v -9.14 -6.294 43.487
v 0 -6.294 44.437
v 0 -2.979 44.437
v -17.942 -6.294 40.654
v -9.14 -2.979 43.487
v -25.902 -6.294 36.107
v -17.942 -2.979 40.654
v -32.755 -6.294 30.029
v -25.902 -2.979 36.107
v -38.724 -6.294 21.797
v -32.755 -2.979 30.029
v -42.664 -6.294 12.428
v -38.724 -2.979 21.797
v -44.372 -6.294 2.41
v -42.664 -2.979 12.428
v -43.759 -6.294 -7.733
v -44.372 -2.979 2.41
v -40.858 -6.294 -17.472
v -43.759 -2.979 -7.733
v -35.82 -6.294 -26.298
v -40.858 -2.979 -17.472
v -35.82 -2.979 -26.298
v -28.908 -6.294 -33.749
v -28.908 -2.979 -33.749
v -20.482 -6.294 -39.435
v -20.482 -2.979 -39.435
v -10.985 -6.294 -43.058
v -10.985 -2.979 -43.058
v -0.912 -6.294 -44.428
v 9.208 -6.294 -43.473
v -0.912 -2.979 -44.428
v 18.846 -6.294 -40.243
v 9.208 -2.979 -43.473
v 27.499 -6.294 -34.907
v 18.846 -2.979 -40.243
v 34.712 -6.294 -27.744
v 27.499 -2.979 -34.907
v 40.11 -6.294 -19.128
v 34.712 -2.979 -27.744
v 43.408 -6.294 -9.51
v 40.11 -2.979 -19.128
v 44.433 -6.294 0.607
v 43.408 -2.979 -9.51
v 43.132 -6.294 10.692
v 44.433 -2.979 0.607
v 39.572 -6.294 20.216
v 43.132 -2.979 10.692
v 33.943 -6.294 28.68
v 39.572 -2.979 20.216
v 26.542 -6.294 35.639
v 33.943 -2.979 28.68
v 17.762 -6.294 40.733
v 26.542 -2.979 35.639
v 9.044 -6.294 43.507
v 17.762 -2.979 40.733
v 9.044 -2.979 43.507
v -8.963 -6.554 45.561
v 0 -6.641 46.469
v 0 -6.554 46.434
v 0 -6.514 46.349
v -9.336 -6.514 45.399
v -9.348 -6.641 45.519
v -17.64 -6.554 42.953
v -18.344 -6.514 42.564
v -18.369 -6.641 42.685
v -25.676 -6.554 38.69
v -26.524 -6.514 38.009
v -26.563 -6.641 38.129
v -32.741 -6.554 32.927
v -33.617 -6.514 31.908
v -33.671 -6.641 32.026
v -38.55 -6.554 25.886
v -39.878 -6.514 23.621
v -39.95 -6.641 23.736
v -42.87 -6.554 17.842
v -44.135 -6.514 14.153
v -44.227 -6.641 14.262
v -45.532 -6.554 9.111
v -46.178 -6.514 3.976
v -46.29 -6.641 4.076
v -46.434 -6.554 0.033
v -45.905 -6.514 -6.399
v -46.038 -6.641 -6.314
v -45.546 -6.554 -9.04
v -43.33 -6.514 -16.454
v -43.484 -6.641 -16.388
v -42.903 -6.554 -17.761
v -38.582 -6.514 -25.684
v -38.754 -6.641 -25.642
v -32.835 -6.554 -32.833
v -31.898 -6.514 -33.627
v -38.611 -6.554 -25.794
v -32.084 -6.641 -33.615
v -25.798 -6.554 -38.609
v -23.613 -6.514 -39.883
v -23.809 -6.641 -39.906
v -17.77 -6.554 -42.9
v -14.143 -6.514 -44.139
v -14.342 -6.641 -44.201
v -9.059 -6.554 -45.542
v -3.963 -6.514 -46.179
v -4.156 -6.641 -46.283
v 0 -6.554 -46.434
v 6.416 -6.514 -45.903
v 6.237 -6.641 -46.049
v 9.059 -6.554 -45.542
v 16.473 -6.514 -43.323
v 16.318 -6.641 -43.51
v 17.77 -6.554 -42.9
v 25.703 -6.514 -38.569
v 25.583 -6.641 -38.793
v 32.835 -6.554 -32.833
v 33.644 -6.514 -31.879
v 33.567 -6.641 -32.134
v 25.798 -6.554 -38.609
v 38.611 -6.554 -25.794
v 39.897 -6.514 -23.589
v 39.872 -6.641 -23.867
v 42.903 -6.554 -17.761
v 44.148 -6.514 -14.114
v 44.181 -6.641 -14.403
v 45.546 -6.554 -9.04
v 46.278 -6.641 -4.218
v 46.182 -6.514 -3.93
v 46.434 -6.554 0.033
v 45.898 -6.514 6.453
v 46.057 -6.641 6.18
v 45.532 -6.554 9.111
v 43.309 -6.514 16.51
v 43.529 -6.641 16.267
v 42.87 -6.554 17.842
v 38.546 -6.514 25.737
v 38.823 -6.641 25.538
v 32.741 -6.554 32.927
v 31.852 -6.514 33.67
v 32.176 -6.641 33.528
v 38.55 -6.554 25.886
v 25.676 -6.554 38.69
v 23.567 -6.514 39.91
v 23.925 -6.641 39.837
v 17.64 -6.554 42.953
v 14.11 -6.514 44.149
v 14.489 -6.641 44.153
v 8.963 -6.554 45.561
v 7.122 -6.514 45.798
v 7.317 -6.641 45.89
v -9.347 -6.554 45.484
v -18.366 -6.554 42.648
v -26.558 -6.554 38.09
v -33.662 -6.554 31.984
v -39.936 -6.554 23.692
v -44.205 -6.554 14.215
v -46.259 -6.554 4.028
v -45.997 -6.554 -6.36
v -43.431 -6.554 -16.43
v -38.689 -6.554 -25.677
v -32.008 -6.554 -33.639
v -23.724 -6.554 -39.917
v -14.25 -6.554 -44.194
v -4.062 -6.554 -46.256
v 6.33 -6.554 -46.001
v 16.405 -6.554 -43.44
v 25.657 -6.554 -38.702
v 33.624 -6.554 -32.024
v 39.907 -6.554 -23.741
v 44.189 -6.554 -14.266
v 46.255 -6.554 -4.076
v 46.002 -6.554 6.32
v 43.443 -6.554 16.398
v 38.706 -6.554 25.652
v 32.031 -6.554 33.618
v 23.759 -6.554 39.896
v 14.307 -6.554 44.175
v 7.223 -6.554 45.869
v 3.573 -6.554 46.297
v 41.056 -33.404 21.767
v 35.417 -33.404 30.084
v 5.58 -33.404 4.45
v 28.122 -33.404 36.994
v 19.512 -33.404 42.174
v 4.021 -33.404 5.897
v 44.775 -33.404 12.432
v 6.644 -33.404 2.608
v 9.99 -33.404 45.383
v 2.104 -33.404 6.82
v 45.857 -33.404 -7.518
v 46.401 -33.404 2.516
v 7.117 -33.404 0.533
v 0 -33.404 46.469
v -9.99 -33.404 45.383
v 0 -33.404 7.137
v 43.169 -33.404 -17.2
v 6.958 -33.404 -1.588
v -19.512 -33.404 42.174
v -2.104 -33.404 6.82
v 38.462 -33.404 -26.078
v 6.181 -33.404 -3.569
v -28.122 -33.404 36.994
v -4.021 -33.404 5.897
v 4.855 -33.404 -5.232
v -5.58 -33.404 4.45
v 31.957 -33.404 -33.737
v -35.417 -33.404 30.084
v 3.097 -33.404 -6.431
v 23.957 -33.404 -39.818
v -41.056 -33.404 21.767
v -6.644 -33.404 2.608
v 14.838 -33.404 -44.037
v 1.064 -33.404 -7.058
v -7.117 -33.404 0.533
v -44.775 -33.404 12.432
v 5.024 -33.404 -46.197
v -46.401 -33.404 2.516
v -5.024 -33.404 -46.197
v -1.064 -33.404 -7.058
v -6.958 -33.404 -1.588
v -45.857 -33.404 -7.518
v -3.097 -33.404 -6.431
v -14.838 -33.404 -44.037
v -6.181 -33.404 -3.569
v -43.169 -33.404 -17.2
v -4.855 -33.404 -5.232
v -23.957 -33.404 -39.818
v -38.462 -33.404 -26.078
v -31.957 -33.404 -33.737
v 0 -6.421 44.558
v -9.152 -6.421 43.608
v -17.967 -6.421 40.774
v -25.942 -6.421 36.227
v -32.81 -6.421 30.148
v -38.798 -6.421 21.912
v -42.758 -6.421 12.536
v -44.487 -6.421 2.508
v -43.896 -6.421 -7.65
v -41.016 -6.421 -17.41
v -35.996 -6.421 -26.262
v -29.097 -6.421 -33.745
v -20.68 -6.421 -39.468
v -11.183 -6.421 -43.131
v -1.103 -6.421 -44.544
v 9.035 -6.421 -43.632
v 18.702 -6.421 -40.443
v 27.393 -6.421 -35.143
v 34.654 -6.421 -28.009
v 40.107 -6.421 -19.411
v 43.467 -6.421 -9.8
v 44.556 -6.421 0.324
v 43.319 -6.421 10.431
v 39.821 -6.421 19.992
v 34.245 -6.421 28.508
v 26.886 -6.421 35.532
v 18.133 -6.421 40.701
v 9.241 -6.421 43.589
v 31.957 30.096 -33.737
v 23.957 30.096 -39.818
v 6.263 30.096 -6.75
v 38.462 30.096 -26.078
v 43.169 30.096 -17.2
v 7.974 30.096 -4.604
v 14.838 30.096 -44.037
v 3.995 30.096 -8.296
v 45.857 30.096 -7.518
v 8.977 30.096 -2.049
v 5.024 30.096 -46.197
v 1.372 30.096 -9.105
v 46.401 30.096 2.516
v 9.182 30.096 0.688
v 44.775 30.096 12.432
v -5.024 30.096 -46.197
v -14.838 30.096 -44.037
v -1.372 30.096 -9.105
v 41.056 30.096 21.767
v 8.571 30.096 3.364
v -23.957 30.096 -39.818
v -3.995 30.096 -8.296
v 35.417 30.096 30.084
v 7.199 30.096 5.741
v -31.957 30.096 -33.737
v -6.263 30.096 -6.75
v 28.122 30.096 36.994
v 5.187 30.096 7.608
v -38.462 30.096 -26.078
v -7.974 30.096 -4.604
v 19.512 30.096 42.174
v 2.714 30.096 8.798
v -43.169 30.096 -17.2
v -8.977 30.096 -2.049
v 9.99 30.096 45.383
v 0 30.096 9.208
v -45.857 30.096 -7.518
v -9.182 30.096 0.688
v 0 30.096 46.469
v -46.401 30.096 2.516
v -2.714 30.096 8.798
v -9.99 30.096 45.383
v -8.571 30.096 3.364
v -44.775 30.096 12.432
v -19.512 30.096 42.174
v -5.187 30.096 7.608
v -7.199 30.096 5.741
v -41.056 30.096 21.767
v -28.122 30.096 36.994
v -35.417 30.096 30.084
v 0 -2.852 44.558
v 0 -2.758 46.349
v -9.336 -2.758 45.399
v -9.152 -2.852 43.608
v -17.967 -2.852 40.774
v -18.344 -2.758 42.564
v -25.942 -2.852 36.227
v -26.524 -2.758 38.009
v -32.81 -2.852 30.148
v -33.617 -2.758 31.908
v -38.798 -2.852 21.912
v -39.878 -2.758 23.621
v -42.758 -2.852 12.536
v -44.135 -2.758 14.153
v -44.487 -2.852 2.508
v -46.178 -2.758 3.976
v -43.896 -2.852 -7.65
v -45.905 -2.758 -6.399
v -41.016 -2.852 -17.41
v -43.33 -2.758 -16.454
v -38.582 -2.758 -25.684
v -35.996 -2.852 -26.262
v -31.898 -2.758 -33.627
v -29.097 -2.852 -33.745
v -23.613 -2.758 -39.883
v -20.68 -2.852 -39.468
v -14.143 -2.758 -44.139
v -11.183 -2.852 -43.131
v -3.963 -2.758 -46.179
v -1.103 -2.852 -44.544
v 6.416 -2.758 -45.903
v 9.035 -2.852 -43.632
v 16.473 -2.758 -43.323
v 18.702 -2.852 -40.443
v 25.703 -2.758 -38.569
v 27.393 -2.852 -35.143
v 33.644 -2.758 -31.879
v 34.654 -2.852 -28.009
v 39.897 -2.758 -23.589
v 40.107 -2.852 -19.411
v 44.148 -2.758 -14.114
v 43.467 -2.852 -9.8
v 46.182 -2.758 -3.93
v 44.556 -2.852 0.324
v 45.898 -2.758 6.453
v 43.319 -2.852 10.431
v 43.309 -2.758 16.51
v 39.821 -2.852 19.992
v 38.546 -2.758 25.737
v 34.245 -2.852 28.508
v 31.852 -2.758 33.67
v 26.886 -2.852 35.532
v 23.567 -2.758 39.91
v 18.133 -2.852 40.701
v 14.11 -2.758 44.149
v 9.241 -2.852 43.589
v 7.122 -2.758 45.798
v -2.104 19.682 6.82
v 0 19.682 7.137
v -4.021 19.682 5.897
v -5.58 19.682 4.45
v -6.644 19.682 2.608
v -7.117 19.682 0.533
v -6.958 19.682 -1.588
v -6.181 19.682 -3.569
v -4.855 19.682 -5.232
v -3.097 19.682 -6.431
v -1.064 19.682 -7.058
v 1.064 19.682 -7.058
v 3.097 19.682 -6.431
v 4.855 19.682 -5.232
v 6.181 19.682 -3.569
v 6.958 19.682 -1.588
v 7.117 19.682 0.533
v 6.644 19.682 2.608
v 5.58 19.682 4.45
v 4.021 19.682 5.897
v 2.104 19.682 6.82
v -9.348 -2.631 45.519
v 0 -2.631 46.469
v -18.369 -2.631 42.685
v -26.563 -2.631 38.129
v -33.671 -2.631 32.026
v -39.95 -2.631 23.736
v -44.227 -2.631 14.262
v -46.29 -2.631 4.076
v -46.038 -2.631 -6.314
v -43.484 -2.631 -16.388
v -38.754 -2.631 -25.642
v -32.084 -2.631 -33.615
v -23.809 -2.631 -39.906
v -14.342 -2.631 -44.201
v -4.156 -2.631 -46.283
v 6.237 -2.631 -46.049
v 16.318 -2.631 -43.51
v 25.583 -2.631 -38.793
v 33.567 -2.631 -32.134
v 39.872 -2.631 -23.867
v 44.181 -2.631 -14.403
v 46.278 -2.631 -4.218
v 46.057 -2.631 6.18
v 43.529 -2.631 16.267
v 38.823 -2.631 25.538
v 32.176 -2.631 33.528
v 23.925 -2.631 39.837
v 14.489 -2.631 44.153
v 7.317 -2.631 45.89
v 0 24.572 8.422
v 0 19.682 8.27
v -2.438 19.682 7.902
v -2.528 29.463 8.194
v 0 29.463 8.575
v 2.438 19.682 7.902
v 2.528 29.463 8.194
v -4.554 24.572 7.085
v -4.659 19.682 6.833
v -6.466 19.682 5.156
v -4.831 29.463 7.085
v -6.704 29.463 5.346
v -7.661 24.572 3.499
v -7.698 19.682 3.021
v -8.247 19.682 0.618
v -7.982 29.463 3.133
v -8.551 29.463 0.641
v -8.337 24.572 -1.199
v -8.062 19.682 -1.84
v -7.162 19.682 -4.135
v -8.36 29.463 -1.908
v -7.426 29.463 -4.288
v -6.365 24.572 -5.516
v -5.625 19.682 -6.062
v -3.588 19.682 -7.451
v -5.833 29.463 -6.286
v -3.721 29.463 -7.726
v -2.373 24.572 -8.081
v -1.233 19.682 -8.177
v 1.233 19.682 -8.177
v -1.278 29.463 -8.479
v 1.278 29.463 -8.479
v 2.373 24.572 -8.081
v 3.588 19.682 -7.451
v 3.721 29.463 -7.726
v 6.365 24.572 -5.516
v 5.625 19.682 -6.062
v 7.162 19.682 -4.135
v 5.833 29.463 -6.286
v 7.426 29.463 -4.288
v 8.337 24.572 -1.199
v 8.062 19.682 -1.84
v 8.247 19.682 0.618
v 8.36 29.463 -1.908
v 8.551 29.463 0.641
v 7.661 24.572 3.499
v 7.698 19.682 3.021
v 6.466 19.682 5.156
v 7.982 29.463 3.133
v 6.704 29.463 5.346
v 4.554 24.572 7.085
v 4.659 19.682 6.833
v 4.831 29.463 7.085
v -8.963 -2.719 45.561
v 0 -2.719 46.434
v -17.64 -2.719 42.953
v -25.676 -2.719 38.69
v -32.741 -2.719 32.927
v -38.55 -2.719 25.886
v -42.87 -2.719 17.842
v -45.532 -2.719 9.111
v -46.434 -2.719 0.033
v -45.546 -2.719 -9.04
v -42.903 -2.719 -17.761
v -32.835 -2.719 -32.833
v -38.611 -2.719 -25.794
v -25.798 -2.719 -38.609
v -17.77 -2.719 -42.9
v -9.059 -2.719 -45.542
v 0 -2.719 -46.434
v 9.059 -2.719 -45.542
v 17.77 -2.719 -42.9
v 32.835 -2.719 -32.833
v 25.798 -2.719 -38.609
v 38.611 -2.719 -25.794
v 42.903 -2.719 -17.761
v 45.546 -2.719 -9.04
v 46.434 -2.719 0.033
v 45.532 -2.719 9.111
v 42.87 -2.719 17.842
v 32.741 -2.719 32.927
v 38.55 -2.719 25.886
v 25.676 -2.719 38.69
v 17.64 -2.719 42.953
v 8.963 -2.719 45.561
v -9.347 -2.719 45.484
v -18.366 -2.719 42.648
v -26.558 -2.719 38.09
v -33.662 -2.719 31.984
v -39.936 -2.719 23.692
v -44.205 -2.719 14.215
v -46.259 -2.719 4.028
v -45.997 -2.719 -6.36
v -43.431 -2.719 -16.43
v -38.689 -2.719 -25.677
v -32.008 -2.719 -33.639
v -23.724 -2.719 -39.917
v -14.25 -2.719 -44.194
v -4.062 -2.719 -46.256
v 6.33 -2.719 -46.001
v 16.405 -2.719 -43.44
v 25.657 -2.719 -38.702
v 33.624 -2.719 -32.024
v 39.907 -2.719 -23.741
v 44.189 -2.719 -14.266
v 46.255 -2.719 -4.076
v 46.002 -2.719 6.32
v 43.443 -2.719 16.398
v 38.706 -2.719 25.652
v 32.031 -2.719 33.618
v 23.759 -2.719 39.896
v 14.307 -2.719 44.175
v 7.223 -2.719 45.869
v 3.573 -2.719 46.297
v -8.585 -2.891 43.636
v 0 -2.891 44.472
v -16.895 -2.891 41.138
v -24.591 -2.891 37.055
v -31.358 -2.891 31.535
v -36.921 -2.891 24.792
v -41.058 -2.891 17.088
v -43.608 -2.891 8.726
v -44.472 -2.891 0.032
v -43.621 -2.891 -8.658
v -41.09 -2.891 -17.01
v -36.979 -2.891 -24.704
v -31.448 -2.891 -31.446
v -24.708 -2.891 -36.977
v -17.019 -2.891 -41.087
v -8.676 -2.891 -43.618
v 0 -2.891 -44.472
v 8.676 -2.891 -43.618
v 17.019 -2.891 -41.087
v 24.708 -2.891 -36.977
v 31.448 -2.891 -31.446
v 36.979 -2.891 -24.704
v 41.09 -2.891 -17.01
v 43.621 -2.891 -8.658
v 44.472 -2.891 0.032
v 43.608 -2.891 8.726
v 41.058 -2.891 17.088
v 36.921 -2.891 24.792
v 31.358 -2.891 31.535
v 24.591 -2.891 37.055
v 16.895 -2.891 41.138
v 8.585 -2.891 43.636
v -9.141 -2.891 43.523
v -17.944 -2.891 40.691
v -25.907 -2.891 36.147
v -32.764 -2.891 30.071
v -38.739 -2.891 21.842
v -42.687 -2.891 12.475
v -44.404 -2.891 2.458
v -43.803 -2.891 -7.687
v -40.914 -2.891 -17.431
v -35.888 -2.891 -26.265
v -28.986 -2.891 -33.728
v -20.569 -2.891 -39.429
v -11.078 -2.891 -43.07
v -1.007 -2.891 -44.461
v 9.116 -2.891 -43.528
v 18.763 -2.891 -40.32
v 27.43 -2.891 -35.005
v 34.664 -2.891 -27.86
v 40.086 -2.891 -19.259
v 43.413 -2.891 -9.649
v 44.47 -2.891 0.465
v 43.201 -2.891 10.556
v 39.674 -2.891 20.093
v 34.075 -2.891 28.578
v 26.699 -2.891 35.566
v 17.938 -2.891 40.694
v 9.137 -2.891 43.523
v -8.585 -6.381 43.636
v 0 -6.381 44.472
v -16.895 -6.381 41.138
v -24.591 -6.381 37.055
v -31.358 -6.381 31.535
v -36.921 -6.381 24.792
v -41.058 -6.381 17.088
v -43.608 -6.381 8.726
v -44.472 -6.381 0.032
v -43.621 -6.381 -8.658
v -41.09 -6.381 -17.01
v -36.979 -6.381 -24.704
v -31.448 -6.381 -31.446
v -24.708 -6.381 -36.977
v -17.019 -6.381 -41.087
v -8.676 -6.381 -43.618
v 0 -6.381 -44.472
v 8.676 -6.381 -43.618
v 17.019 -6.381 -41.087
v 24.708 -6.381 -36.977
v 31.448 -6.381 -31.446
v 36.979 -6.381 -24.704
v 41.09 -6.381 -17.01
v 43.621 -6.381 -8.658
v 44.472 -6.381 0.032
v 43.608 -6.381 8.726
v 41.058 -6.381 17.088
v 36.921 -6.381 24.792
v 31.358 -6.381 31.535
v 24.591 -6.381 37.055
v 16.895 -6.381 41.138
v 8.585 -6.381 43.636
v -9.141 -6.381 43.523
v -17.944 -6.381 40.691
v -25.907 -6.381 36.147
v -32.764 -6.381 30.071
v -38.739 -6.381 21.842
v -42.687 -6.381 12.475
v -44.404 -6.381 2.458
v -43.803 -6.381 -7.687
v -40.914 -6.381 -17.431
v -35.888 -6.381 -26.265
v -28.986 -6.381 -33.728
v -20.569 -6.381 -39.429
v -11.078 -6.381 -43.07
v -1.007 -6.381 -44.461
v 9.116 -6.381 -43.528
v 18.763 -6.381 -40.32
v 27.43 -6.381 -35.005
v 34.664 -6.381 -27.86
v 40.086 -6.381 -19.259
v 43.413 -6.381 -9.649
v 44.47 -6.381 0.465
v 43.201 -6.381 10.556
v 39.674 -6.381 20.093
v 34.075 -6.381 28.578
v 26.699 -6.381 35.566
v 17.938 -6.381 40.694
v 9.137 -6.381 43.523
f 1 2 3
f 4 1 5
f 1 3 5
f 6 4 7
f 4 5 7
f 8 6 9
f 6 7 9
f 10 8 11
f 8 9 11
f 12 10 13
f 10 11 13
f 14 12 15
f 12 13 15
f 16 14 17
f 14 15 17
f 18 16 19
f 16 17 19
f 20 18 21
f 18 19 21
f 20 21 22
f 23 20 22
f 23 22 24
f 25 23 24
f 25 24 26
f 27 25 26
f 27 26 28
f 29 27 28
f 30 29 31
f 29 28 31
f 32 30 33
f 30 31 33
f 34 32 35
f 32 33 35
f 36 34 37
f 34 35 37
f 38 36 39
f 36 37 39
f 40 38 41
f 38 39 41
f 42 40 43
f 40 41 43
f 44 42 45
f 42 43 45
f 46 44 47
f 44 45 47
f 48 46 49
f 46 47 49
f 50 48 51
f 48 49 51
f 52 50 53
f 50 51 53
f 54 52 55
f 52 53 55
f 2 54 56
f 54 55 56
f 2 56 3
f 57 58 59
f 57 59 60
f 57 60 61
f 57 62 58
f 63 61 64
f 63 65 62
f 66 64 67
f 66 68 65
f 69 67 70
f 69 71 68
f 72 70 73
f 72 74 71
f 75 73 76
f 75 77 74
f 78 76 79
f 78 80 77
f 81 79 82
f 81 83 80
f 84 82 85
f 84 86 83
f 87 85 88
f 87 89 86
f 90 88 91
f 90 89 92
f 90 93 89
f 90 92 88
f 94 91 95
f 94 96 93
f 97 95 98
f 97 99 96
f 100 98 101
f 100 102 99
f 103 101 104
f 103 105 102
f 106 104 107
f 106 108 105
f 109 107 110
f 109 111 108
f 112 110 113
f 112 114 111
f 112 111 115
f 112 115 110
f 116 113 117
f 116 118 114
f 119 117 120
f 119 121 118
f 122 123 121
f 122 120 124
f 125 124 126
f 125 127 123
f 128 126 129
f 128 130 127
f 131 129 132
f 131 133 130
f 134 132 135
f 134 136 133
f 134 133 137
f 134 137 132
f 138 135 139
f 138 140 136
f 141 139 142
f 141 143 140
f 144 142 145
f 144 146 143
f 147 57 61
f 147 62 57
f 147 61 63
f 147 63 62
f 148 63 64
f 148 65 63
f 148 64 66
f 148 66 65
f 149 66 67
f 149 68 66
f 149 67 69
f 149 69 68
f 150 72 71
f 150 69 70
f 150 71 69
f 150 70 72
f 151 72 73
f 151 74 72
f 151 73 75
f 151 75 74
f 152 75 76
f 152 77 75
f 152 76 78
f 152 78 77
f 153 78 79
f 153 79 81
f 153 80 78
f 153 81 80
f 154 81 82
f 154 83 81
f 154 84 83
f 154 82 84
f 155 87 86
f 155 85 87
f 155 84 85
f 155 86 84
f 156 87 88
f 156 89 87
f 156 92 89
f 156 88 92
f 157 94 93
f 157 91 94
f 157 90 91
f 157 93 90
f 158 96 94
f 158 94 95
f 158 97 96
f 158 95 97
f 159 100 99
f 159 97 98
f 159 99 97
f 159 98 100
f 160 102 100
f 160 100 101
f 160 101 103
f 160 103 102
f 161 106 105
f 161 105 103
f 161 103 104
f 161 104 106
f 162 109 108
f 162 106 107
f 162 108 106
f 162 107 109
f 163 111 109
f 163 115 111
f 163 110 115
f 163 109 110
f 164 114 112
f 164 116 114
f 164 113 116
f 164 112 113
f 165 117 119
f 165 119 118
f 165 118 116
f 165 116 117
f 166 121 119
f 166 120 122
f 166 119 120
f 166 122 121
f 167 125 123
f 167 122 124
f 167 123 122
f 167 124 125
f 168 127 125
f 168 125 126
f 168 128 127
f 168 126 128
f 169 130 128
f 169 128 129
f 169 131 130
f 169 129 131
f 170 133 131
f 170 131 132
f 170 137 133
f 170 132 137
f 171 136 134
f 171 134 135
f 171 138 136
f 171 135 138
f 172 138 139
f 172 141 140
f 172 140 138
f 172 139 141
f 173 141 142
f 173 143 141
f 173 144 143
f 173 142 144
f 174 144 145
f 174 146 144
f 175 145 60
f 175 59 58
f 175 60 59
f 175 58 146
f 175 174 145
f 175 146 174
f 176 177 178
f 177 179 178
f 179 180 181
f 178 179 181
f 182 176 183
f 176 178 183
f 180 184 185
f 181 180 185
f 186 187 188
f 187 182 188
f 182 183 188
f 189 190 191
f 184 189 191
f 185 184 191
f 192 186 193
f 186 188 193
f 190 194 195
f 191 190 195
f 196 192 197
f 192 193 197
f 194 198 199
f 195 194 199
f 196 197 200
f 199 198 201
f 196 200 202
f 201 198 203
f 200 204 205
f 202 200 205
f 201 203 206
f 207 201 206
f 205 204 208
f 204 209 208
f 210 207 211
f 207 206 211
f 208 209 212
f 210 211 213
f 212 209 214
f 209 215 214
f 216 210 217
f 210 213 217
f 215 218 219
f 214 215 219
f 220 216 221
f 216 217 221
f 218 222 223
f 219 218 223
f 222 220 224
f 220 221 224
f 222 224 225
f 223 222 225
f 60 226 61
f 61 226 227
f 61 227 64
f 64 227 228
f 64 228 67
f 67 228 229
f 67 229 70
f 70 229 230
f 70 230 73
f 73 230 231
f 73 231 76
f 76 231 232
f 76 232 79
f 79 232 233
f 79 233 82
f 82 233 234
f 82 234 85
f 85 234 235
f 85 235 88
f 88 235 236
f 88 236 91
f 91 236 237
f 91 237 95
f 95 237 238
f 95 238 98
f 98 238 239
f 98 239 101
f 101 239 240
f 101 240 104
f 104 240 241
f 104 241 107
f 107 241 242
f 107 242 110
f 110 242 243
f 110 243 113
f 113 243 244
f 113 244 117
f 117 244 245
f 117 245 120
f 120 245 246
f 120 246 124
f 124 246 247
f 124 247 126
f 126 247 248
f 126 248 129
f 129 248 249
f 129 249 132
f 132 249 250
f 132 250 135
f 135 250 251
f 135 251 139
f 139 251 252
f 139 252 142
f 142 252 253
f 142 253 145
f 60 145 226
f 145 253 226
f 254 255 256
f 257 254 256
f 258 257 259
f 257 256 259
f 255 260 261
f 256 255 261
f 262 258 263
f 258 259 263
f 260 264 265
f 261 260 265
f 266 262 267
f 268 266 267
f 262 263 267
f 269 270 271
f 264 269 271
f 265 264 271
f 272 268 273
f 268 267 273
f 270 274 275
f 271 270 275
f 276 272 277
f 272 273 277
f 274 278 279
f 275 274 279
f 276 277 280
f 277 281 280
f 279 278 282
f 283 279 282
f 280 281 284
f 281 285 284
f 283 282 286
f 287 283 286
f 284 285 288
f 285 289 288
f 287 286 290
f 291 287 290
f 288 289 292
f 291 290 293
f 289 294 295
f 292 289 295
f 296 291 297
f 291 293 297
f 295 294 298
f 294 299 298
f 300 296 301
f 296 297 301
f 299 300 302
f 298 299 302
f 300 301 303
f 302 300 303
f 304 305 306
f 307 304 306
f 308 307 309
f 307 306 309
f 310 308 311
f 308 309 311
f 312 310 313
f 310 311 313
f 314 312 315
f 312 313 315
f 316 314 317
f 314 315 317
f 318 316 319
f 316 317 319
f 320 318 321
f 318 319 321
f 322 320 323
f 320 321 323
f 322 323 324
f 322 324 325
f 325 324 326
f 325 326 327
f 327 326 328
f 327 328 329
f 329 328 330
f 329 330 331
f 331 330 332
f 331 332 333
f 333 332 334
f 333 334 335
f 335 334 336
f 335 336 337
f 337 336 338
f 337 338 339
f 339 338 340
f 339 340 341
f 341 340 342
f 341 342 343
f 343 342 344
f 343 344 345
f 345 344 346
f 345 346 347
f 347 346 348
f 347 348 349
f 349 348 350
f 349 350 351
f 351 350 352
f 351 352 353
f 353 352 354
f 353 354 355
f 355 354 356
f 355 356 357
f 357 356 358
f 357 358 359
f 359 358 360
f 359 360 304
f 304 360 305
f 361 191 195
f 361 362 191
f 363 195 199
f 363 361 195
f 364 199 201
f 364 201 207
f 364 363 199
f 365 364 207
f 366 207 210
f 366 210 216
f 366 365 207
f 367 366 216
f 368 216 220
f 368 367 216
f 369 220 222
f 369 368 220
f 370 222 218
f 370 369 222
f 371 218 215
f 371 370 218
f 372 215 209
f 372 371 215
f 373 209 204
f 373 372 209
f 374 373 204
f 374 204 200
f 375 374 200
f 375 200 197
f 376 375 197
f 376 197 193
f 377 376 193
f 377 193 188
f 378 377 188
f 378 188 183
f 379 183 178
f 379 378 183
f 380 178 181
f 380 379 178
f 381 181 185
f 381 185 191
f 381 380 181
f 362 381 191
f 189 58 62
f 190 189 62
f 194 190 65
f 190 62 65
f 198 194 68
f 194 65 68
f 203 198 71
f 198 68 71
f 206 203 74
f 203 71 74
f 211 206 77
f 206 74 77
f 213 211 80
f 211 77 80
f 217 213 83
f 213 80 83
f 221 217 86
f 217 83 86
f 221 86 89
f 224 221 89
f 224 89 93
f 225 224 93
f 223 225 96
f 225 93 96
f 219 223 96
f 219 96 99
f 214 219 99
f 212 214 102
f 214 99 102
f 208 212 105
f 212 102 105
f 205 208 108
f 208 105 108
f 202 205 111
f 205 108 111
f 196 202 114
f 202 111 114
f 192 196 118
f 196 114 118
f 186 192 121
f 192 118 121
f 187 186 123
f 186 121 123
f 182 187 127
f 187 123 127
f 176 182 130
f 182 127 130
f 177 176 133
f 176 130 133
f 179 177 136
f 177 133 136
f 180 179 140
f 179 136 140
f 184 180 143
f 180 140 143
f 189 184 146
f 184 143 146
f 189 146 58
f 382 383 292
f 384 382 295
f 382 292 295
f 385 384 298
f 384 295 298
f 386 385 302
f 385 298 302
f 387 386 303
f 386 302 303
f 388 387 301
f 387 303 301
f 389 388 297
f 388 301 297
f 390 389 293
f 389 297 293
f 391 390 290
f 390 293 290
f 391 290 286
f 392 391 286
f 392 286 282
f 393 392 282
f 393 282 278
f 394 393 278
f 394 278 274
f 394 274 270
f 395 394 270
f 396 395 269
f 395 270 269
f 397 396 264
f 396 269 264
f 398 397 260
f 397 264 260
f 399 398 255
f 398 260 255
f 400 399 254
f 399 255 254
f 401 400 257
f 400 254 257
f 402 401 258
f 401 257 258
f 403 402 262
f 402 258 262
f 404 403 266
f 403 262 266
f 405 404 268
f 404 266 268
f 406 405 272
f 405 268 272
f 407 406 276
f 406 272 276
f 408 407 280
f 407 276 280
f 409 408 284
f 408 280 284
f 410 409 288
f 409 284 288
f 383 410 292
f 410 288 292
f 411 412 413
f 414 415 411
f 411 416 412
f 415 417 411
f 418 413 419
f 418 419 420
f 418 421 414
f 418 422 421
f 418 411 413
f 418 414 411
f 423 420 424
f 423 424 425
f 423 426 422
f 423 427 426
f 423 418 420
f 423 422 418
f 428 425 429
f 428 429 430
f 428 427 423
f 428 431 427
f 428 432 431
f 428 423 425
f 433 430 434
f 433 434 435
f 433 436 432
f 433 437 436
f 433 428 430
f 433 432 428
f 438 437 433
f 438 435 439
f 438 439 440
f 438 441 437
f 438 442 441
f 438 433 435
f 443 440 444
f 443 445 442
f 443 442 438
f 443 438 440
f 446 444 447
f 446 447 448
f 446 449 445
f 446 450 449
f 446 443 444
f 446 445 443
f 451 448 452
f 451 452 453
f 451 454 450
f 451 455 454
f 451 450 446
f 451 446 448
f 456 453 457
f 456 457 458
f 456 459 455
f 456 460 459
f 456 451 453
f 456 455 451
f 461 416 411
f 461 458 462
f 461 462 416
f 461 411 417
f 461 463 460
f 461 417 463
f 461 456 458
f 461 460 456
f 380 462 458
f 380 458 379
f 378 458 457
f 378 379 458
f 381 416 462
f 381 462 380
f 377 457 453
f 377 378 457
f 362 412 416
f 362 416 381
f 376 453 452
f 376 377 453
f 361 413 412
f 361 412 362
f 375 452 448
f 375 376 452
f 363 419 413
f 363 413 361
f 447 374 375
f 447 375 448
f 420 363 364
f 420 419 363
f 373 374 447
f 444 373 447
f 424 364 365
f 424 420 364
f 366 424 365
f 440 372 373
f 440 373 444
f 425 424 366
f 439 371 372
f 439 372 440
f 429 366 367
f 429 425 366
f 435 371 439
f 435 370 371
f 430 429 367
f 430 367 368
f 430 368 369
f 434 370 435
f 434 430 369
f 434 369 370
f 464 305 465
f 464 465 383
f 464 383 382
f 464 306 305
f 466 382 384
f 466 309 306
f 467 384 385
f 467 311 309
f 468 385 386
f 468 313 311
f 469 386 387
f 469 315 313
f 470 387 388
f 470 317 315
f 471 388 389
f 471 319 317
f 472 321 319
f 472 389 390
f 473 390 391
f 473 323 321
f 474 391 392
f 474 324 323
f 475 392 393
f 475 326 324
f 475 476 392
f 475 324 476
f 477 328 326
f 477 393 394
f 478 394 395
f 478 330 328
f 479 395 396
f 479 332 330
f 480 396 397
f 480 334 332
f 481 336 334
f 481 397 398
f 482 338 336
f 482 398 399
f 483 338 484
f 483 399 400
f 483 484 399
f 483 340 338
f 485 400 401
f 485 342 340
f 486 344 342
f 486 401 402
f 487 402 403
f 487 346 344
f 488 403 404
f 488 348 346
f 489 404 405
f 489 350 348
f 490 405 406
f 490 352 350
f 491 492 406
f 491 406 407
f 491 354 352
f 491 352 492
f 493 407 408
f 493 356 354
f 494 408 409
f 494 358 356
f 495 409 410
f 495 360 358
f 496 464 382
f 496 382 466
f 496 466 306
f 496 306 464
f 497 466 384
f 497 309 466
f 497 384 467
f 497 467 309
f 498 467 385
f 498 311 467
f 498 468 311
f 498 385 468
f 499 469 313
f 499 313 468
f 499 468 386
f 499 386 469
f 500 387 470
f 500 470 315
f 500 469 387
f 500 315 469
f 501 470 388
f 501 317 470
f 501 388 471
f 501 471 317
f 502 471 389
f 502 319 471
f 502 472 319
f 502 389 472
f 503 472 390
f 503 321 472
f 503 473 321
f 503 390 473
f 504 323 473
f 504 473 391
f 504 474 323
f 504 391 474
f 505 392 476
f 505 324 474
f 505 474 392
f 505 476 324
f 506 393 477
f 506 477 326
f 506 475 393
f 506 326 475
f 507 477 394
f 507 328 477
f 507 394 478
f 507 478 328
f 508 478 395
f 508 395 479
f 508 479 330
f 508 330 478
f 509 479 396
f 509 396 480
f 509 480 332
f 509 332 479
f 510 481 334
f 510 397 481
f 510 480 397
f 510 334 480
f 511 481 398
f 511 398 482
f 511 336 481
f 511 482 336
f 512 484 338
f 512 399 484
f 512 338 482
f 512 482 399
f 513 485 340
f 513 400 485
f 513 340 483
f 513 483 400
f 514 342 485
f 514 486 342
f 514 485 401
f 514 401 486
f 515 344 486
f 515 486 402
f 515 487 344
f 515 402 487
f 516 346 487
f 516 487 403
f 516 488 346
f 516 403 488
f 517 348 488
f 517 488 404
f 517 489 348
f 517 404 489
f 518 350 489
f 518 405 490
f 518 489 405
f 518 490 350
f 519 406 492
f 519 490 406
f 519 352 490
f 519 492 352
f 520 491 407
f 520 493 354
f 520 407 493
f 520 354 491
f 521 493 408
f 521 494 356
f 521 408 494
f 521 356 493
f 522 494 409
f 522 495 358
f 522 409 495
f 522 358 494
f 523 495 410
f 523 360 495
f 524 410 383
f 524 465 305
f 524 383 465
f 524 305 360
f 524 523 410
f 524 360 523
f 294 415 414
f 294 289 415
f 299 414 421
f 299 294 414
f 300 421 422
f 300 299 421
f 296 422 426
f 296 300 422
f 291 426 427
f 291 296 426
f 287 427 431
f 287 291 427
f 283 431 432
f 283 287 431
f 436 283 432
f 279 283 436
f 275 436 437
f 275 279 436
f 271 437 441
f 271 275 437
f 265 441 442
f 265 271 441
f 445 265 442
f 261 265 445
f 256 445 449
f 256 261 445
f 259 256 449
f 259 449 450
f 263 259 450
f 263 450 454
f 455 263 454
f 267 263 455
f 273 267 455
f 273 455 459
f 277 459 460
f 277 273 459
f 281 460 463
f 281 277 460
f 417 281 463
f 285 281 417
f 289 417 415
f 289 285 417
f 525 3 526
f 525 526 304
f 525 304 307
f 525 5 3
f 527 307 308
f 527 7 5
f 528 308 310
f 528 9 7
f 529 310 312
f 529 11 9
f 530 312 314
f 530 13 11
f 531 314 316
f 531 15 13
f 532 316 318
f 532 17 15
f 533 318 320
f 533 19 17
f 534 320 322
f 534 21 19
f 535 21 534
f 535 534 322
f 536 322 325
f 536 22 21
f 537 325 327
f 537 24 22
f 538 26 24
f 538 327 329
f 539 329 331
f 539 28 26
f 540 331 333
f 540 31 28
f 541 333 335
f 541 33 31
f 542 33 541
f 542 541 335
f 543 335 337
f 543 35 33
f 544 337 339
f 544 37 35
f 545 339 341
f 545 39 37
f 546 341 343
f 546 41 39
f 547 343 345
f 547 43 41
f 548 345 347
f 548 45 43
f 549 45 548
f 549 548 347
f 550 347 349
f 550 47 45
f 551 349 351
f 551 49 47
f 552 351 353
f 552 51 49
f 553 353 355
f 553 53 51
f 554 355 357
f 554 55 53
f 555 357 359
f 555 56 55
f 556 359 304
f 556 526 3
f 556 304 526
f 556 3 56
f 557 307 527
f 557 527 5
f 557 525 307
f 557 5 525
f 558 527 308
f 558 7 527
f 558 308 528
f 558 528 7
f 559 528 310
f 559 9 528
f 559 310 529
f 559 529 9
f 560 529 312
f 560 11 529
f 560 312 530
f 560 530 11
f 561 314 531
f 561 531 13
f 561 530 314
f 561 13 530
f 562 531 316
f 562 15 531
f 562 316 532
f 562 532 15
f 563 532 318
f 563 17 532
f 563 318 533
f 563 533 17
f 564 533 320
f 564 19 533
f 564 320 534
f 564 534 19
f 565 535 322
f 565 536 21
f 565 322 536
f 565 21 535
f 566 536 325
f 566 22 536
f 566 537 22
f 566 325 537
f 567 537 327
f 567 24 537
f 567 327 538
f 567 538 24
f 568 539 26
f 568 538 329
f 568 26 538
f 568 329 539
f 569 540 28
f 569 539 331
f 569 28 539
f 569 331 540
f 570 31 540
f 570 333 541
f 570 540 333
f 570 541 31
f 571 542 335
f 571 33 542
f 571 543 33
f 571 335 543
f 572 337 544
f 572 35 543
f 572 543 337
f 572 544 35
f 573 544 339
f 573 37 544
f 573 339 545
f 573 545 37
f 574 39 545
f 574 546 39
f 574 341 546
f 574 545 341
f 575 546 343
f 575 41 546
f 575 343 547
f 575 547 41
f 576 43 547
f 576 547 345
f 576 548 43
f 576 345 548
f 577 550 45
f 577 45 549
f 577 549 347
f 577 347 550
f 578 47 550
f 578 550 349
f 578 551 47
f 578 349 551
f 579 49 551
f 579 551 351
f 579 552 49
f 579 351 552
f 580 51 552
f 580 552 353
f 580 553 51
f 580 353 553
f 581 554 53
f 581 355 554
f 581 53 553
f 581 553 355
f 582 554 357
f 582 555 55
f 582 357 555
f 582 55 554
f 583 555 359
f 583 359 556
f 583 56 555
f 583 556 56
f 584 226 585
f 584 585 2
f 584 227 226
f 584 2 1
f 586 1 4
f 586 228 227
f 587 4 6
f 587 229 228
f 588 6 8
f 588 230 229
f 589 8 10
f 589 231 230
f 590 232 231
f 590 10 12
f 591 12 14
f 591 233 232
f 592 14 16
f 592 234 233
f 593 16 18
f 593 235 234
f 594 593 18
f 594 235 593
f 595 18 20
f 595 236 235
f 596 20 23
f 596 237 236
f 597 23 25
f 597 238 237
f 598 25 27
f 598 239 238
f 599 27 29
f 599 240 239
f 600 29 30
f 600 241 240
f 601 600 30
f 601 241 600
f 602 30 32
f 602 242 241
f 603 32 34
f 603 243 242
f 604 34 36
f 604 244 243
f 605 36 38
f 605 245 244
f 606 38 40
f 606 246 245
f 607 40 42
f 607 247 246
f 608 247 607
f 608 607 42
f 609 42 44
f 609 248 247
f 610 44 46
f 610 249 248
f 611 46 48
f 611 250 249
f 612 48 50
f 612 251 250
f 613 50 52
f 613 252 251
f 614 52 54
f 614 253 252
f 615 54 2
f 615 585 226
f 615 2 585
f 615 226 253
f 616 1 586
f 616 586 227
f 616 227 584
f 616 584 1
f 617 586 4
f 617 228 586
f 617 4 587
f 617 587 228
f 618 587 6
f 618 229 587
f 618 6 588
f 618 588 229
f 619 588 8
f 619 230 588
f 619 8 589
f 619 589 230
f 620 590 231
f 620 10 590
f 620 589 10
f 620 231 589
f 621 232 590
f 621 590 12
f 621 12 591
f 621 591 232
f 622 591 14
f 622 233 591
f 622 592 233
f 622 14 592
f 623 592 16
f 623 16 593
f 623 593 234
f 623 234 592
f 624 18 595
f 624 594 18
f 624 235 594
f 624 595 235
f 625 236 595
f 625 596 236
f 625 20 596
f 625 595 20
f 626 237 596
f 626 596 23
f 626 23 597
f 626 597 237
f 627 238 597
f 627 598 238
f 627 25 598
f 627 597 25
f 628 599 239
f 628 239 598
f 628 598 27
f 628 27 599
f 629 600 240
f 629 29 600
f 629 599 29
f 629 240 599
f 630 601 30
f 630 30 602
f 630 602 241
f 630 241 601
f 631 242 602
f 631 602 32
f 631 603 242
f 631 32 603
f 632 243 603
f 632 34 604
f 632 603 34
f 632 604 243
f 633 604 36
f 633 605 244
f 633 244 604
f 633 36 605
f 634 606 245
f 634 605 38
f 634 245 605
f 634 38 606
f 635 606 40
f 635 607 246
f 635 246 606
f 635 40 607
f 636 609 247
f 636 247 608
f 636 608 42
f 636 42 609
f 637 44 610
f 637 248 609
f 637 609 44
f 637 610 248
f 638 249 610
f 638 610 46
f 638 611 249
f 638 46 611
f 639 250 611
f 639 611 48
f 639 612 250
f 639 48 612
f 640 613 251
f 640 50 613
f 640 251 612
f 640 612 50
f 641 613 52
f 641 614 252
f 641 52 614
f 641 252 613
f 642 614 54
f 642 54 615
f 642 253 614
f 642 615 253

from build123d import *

# Parameters (mm, degrees)
FILLET1_R = 0.127
FILLET2_R = 0.127


with BuildPart() as part:
    # Sketch1 → Revolve3 (revolve)
    with BuildSketch(Plane.XY, mode=Mode.PRIVATE) as revolve3_sk:
        Polygon((0, -33.404421277), (-46.4693, -33.404421277), (-46.4693, -6.520721208), (-44.4373, -6.414228601), (-44.4373, -2.858228601), (-46.4693, -2.751735993), (-46.4693, 30.095578723), (0, 30.095578723), align=None)
    revolve(revolve3_sk.sketch.rotate(Axis((0, 32.189409805, 0), (0, -1, 0)), 270), axis=Axis((0, 32.189409805, 0), (0, -1, 0)))

    # Fillet1
    fillet1_edges = [part.edges().sort_by_distance(p)[0] for p in [
        (0, -2.751735993, -46.4693),
        (0, -6.520721208, -46.4693),
    ]]
    fillet(fillet1_edges, radius=FILLET1_R)

    # Fillet2
    fillet2_edges = [part.edges().sort_by_distance(p)[0] for p in [
        (0, -2.858228601, -44.4373),
        (0, -6.414228601, -44.4373),
    ]]
    fillet(fillet2_edges, radius=FILLET2_R)

    # Sketch10 → 3/8 NPT Tapped Hole2 (revolve, cut)
    with BuildSketch(Plane(origin=(0, 30.095578723, 0), x_dir=(0, 0, 1), z_dir=(1, 0, 0))):
        Polygon((0, 0), (0, 63.5), (7.1374, 63.5), (7.1374, 10.414), (8.269741561, 10.414), (8.5751162, 0.6323838), (9.2075, 0), align=None)
    revolve(axis=Axis((0, 36.445578723, 0), (0, -1, 0)), mode=Mode.SUBTRACT)


solid = part.part
